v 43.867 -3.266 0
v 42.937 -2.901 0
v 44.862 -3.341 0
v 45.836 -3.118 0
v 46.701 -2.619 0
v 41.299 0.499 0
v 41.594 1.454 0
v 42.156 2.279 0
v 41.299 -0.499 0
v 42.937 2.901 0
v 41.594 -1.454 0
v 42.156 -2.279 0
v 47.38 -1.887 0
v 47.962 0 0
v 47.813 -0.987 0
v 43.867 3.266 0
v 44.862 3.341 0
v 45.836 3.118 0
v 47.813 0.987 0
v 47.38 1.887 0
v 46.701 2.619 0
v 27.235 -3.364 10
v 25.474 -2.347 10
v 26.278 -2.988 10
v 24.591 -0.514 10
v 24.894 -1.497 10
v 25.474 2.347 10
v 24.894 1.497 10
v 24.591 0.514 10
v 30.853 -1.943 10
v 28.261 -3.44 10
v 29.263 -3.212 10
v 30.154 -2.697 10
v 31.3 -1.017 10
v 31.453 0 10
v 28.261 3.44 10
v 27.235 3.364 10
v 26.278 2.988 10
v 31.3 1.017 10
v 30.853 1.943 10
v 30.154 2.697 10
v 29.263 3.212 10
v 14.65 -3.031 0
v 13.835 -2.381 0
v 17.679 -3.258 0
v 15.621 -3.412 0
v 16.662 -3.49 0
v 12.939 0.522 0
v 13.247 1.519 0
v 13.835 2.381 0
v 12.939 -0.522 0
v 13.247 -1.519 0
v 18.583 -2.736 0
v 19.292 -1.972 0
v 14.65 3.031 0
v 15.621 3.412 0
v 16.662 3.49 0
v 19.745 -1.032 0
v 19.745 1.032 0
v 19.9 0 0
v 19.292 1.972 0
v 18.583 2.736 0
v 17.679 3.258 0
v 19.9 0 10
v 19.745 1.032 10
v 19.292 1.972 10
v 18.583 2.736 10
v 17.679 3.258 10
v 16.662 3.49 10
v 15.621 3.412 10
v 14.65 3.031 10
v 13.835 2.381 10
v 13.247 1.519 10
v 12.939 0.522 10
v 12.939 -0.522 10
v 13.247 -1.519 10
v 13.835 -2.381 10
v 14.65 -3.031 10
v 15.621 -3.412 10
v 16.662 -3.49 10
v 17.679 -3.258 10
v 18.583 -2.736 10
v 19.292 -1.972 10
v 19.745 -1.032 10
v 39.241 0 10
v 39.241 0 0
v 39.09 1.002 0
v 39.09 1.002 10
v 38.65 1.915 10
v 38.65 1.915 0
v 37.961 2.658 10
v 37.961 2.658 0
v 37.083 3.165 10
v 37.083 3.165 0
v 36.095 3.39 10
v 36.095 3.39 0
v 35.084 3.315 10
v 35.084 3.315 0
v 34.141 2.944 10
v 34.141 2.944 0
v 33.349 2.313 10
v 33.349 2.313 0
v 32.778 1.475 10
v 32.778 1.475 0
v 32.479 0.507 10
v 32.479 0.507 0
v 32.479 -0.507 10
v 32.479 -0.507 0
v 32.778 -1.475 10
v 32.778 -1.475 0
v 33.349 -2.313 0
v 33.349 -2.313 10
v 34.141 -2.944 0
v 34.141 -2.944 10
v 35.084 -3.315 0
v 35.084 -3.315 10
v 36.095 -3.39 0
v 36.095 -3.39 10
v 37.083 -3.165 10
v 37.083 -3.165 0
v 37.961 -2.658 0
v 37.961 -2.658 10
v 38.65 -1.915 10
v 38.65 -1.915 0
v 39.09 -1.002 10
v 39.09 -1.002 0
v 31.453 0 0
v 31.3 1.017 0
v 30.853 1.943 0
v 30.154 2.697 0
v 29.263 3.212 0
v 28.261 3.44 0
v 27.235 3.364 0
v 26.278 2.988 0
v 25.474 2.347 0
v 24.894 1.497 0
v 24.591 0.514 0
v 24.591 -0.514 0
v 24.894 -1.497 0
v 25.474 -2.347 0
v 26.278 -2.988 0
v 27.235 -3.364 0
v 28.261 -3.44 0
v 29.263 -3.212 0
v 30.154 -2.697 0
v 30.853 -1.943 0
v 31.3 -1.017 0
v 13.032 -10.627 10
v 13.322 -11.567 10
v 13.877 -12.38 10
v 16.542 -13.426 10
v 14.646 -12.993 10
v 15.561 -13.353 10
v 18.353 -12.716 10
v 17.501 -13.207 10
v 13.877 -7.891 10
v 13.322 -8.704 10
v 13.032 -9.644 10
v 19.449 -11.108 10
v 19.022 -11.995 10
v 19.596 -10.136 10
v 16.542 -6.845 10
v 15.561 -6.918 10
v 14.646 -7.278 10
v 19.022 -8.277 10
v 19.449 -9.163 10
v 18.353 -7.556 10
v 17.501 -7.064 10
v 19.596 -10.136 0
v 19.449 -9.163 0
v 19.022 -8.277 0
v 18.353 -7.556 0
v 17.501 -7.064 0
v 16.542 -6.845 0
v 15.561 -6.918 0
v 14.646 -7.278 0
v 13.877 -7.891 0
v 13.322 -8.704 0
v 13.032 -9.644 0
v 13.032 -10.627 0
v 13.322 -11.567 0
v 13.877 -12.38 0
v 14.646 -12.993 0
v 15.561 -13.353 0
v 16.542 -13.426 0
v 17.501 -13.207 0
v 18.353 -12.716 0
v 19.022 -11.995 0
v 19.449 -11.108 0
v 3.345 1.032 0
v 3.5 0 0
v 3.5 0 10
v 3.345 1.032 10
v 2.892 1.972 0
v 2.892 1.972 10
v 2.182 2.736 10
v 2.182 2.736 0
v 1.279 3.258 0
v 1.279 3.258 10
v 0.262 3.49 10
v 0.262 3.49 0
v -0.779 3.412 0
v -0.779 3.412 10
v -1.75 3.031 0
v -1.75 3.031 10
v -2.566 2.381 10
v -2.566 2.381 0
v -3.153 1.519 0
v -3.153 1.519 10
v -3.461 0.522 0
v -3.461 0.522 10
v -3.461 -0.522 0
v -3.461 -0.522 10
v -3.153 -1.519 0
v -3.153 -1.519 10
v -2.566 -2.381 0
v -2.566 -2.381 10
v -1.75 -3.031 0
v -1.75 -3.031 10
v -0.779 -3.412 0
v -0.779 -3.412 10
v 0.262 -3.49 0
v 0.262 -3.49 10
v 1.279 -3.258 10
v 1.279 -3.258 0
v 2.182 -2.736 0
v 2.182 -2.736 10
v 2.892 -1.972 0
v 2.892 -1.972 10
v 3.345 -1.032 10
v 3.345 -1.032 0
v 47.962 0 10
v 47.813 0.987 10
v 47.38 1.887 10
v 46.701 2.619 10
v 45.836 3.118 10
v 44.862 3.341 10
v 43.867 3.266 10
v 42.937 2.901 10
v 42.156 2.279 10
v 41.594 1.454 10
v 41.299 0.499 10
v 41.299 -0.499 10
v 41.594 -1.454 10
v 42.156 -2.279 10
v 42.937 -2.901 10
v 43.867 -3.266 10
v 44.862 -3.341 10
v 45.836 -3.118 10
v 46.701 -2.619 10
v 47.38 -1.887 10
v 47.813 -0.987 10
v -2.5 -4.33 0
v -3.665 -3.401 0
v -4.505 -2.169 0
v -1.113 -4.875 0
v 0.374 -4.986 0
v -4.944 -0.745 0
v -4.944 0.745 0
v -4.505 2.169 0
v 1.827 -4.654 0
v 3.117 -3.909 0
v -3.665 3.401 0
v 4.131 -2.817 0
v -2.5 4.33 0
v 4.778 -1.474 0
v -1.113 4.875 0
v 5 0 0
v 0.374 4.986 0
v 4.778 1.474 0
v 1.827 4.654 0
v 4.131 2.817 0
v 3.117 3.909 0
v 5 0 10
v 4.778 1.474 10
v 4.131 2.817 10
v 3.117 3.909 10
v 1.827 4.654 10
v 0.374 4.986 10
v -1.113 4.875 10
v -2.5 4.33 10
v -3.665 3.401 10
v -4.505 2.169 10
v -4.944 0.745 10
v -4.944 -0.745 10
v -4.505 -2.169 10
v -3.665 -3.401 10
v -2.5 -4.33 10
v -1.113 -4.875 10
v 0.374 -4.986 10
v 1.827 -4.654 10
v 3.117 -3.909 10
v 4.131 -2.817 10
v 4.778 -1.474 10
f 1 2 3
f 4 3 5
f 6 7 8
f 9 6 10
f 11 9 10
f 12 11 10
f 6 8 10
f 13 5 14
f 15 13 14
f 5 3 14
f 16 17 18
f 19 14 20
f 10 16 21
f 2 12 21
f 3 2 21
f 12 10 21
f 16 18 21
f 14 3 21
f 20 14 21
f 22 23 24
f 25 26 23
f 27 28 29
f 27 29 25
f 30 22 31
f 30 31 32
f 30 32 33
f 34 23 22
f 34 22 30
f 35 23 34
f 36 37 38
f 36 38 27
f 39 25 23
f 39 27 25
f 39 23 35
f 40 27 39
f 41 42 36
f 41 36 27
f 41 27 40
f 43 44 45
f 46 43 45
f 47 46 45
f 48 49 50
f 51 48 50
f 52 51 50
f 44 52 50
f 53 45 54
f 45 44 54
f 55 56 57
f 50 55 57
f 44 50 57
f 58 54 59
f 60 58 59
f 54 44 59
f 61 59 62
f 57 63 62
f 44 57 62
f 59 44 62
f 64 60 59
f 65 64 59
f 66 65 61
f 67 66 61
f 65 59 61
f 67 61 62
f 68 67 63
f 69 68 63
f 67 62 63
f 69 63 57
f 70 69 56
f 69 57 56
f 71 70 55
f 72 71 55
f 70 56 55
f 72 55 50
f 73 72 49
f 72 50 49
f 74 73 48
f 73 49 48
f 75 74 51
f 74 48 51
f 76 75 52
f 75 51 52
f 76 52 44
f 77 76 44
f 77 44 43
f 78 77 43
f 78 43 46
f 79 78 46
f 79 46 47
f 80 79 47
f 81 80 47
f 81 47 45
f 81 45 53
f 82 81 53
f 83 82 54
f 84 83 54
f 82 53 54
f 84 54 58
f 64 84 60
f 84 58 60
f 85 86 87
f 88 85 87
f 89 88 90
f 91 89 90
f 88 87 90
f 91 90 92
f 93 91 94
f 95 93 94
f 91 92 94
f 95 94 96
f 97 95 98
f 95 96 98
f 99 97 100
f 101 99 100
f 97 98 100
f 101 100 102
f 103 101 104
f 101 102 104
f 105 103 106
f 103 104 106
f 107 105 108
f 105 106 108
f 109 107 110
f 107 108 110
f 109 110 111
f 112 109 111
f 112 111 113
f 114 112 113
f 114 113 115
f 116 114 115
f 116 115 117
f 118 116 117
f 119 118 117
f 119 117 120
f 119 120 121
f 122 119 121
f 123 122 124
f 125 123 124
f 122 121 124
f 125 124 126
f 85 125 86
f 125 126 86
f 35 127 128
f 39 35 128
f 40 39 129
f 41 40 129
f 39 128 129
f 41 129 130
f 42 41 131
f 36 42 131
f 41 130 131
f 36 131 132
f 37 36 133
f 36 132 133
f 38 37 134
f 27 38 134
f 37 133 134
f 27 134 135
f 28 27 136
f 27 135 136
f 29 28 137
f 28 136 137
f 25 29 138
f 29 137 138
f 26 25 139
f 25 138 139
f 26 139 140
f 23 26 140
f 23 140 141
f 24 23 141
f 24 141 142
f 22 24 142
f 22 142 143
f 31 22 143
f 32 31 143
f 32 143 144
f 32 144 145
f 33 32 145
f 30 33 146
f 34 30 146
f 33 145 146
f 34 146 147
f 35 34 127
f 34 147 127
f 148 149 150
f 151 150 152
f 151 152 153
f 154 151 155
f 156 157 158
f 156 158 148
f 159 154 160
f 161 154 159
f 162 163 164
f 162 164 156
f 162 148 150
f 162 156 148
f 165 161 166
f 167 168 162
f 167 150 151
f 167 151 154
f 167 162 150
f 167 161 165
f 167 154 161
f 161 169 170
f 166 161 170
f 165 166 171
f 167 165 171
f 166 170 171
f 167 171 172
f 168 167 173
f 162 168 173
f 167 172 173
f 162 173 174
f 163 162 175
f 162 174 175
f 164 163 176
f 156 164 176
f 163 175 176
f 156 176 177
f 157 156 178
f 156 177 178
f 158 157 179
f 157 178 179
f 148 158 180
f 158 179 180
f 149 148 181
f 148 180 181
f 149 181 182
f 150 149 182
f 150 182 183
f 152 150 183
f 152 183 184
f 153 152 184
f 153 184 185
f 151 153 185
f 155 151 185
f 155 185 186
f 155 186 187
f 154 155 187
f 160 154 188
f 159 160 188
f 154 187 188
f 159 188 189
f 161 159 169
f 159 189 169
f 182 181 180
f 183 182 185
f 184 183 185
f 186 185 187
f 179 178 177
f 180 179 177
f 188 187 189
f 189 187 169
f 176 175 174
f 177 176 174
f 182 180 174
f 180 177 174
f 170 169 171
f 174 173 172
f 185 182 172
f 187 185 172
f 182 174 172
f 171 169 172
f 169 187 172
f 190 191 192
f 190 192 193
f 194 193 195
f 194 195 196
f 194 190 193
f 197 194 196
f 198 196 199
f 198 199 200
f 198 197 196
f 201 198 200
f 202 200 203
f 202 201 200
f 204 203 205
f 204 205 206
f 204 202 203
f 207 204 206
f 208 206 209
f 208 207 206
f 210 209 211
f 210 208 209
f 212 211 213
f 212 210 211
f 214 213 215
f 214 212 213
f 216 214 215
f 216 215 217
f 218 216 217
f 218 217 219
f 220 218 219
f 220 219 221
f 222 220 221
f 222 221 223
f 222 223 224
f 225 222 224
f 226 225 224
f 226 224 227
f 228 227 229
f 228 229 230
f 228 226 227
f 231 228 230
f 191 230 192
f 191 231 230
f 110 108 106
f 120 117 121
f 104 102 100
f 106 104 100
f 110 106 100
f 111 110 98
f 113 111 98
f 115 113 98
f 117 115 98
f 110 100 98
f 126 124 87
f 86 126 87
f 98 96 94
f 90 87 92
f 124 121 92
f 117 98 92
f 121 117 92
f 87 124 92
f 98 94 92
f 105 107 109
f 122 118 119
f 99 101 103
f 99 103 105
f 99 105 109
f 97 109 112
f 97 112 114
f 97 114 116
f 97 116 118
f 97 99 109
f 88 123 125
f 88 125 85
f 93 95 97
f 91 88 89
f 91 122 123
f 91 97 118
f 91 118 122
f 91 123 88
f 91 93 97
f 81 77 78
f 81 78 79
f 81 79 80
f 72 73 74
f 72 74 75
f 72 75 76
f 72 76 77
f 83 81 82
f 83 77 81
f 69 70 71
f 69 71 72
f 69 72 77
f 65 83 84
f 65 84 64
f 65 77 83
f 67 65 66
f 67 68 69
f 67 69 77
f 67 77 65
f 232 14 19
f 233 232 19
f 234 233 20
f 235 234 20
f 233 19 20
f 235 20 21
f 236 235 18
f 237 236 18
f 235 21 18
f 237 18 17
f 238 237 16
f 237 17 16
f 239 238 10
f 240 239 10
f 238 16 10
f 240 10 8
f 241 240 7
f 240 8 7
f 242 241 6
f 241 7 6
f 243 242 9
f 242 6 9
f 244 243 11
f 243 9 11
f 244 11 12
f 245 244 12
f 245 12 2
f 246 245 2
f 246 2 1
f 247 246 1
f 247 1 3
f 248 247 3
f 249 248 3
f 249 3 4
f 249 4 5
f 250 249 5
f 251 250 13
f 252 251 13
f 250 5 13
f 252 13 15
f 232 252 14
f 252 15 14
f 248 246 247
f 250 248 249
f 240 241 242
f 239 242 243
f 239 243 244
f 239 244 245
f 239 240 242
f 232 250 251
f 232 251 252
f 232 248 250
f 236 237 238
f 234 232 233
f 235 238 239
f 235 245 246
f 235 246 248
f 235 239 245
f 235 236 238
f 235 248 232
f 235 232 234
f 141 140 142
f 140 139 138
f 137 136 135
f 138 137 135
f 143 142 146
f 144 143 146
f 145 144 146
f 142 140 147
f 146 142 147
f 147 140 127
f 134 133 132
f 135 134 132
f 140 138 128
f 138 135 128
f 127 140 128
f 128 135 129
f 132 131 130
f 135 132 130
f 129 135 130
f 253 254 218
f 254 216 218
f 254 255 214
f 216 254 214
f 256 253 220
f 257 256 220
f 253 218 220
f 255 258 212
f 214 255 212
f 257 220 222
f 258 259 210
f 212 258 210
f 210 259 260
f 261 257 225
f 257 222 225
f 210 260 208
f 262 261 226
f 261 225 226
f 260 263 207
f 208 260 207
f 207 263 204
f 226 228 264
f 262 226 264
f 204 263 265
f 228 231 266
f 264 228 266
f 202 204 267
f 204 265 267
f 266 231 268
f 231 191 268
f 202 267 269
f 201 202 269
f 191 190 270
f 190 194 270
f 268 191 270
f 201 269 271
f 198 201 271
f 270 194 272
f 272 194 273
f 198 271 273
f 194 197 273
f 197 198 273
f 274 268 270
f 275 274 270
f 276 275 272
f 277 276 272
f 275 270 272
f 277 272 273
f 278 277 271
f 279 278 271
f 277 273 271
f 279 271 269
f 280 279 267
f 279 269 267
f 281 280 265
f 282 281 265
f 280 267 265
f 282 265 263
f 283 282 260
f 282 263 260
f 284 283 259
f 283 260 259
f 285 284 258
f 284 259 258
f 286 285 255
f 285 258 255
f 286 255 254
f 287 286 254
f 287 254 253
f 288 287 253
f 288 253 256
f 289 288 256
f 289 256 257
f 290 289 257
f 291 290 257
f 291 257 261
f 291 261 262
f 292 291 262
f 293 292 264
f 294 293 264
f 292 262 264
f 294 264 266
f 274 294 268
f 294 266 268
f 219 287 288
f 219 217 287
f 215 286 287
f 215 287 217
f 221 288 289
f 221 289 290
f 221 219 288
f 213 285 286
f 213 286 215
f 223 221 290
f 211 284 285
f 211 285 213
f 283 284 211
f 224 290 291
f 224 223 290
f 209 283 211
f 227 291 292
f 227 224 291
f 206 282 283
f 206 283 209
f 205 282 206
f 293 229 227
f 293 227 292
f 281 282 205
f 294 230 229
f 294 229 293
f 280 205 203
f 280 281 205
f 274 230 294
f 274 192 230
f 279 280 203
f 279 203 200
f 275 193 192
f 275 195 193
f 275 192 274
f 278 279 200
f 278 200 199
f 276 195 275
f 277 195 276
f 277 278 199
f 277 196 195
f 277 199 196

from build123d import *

# Parameters (mm, degrees)
F0_R     = 5
F0_R_2   = 3.5
F0_R_3   = 3.45
F0_R_4   = 3.4
F0_R_5   = 3.35
F0_R_6   = 3.3
F1_DEPTH = 10


with BuildPart() as f1:
    # F0 (on Top) → F1 (new body)
    with BuildSketch(Plane.XY):
        Circle(F0_R)
        Circle(F0_R_2, mode=Mode.SUBTRACT)
        with Locations((16.400298, 0)):
            Circle(F0_R_2)
        with Locations((28.002821, 0)):
            Circle(F0_R_3)
        with Locations((35.841003, 0)):
            Circle(F0_R_4)
        with Locations((44.611964, 0)):
            Circle(F0_R_5)
        with Locations((16.295603, -10.135558)):
            Circle(F0_R_6)
    extrude(amount=F1_DEPTH)


solid = f1.part
